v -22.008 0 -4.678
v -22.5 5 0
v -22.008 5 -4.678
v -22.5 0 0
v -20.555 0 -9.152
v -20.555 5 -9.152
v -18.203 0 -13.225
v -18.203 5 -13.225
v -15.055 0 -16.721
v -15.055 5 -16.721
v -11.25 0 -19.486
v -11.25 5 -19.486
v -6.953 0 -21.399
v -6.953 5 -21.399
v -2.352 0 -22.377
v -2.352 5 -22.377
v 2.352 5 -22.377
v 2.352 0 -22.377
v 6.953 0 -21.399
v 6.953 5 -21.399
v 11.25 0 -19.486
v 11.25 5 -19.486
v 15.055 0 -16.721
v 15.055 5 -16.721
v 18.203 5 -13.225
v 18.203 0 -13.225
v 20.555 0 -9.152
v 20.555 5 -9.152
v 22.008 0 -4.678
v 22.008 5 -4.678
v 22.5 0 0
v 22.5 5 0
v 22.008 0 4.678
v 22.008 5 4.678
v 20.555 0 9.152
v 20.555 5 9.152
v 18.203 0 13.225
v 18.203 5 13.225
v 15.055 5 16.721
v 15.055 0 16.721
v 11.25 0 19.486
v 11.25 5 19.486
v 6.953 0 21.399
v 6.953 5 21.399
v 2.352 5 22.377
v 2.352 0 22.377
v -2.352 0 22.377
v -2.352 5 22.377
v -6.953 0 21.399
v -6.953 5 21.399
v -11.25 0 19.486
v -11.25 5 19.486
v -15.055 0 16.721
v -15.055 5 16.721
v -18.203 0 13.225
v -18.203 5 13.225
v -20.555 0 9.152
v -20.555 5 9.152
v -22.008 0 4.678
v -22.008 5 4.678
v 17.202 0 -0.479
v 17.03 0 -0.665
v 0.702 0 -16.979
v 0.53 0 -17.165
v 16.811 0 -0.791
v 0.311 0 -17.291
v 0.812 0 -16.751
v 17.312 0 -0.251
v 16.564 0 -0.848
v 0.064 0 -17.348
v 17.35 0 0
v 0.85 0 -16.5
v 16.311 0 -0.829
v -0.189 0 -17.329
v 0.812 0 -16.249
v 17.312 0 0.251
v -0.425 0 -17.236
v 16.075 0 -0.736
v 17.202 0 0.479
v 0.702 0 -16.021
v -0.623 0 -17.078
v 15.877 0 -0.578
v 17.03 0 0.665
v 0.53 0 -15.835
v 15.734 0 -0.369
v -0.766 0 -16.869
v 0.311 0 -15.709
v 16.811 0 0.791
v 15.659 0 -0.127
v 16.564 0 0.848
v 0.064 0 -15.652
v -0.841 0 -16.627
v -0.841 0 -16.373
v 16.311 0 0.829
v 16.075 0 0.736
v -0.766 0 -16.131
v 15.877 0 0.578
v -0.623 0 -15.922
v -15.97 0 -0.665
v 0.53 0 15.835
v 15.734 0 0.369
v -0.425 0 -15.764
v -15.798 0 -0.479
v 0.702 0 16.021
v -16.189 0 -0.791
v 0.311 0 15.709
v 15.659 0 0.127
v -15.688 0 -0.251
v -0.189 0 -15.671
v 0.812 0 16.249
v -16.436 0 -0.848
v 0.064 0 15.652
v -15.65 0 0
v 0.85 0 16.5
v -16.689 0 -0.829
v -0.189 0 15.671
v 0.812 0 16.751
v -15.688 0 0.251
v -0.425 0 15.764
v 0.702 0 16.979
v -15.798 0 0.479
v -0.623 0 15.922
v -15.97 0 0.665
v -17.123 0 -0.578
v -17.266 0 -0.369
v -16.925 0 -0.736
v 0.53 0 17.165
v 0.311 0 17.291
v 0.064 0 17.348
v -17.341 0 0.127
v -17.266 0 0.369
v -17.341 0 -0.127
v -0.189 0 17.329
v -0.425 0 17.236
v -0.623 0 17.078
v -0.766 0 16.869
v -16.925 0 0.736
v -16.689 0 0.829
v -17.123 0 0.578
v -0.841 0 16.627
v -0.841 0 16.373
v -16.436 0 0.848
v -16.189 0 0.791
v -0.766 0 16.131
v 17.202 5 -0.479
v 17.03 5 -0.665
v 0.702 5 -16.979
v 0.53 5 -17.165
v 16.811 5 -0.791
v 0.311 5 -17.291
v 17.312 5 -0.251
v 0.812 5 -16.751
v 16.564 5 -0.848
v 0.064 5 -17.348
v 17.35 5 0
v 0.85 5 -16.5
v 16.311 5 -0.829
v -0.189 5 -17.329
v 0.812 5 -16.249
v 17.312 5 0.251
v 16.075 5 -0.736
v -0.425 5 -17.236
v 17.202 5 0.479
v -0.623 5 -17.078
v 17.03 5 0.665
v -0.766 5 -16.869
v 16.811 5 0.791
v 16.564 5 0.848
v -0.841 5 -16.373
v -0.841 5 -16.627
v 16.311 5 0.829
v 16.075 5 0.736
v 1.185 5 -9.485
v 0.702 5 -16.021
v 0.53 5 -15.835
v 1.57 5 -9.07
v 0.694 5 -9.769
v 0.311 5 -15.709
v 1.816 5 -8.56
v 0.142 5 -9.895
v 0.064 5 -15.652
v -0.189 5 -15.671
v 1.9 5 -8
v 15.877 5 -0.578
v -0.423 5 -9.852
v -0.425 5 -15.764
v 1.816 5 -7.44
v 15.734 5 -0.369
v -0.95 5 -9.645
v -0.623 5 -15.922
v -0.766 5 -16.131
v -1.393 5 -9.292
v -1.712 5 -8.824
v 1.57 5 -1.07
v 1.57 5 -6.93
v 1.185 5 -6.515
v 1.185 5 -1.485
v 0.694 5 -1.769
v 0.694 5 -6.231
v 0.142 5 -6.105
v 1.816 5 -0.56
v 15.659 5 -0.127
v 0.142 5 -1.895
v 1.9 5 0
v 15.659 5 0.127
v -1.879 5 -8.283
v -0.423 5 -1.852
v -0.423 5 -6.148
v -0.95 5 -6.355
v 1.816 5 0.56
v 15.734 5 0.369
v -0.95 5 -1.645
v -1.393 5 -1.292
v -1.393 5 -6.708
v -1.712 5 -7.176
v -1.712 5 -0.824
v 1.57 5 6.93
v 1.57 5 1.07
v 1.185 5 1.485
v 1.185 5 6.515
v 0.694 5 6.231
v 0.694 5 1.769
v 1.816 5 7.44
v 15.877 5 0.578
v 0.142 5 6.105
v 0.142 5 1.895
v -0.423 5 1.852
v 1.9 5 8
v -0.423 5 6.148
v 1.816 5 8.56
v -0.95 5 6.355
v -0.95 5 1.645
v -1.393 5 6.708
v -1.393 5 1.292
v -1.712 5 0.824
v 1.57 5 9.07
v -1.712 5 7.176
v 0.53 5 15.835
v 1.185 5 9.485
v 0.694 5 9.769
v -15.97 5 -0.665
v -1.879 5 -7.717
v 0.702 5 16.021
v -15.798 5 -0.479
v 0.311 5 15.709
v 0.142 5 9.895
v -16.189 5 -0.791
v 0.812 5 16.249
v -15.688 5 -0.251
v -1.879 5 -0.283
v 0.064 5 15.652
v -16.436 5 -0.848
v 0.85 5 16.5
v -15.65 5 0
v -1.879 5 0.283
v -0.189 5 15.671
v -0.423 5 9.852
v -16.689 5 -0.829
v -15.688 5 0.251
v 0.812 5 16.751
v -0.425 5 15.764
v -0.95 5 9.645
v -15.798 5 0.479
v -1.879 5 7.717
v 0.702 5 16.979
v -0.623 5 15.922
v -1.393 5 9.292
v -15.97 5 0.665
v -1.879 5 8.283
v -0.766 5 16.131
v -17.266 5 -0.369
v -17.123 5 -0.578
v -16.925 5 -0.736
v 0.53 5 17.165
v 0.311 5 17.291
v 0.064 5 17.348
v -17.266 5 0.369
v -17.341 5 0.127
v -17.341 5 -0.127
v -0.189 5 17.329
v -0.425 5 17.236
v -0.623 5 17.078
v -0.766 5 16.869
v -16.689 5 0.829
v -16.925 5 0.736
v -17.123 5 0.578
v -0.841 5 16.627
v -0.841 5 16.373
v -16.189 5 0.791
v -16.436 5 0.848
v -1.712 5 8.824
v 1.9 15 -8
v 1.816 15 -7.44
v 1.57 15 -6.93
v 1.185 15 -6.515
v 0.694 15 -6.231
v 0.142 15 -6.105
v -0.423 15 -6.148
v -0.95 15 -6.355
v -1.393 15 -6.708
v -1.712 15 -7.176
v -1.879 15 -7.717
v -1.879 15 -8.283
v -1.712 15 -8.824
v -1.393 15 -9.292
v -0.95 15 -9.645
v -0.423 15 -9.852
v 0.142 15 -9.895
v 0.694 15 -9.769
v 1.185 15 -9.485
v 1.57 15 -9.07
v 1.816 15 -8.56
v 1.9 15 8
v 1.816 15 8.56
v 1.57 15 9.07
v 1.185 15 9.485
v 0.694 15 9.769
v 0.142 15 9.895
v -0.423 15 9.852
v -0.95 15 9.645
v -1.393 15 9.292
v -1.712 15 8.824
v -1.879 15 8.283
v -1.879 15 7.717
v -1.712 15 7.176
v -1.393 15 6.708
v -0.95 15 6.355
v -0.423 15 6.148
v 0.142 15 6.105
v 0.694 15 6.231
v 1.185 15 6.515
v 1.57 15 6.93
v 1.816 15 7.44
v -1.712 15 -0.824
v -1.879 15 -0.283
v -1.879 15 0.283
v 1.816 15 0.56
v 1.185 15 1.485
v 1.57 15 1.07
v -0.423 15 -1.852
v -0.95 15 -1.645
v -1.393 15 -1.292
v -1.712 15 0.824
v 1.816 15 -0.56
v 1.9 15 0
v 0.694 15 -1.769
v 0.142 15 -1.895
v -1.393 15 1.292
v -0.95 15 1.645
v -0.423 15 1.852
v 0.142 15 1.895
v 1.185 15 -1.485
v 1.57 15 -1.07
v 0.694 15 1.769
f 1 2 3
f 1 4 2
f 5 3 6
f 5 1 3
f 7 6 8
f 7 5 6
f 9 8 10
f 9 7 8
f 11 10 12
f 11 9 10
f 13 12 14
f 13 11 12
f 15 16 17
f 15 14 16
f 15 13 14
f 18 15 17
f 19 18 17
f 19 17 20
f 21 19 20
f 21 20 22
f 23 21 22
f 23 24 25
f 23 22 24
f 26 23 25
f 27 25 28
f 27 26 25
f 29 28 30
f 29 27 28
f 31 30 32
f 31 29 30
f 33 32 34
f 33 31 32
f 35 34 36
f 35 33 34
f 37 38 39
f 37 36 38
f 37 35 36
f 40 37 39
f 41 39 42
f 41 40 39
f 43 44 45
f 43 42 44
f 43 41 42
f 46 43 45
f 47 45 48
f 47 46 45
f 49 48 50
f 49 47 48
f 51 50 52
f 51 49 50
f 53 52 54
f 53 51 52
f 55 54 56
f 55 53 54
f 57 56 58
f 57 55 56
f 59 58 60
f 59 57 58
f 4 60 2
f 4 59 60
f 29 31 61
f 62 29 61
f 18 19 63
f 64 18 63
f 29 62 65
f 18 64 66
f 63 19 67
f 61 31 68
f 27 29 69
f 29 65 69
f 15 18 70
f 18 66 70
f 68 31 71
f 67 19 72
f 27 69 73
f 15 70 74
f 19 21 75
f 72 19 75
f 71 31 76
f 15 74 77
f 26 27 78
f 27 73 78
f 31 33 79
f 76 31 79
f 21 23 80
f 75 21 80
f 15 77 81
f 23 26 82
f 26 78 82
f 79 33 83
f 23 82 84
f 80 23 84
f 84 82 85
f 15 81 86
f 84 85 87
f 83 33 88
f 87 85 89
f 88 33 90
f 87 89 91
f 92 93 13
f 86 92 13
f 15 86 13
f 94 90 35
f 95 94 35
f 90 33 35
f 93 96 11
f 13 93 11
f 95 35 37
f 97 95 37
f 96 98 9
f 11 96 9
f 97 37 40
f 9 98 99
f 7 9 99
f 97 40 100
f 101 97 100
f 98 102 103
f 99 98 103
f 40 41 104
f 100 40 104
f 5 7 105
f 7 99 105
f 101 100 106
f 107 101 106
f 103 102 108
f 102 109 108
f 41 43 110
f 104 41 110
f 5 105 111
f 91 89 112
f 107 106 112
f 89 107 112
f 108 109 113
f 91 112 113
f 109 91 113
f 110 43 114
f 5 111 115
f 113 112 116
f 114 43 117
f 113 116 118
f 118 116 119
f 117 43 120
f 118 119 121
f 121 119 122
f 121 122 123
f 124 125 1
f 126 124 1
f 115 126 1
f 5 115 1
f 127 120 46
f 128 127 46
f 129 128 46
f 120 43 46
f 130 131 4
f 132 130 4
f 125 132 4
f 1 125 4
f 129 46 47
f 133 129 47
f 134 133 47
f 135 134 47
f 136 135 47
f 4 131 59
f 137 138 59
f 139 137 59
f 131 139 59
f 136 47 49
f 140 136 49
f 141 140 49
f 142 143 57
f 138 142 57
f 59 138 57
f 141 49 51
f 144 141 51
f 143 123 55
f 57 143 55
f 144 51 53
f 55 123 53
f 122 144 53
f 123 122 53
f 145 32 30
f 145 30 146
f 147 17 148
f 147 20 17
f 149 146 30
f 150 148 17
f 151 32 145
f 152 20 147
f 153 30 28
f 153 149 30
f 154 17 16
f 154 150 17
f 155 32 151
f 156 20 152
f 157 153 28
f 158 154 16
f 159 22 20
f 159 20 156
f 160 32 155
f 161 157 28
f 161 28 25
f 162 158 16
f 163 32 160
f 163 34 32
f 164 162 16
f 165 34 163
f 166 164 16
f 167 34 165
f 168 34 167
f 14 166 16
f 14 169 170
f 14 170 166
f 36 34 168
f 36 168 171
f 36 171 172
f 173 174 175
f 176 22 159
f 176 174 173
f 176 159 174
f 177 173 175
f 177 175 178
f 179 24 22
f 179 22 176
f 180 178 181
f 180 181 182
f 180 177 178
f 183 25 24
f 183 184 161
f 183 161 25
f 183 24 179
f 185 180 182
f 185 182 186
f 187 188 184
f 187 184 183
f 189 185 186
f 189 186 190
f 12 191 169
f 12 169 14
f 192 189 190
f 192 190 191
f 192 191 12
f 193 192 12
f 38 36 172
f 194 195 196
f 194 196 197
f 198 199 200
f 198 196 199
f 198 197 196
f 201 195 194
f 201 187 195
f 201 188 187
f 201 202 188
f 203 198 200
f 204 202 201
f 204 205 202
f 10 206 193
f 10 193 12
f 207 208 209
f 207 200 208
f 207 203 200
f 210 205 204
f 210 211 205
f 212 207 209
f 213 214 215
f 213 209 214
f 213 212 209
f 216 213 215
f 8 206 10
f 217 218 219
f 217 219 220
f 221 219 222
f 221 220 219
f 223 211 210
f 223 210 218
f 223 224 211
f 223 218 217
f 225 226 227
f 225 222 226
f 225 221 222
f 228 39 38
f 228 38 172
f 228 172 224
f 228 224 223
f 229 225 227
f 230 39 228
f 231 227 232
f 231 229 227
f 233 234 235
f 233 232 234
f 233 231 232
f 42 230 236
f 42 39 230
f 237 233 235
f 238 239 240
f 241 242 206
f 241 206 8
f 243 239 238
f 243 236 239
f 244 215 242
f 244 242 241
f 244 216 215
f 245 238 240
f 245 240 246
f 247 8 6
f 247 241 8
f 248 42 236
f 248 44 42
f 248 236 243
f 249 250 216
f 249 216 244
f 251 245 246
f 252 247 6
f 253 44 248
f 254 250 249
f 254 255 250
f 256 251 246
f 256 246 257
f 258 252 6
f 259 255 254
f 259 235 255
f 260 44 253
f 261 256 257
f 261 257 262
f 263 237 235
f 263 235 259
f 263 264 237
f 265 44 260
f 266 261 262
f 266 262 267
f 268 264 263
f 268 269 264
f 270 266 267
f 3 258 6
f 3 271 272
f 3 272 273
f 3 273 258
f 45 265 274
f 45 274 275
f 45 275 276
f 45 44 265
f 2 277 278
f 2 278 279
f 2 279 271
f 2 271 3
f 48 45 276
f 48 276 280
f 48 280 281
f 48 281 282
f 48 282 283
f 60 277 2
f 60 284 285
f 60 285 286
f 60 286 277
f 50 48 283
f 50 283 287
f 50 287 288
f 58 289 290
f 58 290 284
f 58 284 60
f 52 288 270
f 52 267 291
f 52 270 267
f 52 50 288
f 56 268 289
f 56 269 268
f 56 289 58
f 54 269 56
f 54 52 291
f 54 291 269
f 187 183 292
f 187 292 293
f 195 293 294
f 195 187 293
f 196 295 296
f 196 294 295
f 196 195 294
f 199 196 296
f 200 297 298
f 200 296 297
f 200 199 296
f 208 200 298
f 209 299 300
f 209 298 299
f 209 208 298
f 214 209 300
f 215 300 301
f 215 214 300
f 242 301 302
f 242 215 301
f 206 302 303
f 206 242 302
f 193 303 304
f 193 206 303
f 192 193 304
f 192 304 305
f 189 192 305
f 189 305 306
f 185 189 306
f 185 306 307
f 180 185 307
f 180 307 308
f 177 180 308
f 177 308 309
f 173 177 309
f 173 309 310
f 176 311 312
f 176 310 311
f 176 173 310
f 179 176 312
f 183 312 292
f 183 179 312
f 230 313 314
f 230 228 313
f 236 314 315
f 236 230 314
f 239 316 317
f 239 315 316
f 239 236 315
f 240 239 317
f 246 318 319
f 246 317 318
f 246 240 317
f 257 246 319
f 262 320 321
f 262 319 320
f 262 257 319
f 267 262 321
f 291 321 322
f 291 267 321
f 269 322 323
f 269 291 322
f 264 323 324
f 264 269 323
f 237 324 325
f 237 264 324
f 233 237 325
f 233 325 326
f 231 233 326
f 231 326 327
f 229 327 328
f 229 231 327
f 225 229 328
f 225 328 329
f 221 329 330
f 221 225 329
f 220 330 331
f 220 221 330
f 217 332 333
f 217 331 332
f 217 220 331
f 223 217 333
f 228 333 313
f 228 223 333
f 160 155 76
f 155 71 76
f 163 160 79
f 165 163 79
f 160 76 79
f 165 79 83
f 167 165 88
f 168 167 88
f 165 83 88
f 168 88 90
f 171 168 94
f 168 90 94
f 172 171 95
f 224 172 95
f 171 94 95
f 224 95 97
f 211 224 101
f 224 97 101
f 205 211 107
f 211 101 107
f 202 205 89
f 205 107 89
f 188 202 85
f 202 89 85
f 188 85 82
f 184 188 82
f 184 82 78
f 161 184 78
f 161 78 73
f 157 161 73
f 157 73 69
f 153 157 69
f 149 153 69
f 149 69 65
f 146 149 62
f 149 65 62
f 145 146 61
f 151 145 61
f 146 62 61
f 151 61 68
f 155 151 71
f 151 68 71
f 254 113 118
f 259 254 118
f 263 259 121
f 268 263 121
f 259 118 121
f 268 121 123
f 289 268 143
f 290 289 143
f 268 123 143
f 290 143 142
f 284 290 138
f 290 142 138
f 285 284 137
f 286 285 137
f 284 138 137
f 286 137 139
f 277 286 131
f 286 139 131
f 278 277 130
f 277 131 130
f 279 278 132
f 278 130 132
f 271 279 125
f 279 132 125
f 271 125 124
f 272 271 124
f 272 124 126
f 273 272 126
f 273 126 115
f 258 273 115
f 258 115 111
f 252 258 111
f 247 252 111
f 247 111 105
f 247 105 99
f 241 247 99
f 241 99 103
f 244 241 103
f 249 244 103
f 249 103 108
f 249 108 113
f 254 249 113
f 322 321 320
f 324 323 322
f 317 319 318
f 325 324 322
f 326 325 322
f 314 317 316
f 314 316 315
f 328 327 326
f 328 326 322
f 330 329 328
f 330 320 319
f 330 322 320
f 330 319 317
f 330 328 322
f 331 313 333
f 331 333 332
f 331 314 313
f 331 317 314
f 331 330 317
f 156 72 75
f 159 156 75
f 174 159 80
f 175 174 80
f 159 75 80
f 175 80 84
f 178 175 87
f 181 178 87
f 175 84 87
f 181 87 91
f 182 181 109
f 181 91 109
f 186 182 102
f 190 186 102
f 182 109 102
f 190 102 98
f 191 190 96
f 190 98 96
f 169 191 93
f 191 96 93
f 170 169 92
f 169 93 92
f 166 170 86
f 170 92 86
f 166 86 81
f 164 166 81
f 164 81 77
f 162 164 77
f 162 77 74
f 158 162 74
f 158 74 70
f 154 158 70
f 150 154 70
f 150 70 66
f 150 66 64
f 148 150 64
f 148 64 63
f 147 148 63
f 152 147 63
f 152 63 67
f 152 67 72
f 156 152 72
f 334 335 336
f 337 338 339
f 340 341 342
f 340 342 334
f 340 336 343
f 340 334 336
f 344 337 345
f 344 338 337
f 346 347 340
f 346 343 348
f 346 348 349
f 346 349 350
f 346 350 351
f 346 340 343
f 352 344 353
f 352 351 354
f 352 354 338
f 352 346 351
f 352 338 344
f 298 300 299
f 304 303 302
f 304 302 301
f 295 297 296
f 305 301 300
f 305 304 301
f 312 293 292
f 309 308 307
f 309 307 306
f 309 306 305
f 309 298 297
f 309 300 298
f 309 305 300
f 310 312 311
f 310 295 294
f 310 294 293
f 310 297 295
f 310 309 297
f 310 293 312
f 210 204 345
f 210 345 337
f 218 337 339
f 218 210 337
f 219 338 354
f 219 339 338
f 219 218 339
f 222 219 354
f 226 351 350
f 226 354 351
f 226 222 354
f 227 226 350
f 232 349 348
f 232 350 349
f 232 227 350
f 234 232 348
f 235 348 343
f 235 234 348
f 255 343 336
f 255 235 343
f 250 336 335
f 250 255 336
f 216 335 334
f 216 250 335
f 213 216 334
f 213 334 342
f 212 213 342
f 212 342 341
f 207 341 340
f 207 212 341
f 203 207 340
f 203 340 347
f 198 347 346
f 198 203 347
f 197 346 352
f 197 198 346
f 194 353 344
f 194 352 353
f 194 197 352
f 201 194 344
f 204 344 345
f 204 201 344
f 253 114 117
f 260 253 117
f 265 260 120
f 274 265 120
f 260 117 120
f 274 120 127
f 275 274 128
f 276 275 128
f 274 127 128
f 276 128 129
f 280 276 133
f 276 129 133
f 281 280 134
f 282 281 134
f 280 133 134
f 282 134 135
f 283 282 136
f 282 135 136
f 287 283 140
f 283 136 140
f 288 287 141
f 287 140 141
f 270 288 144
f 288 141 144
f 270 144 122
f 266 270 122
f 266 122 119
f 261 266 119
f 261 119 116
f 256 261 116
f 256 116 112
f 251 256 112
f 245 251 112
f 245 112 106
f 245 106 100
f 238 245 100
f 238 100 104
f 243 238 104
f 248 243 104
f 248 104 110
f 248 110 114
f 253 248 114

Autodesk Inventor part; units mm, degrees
ref_plane "YZ Plane" through (0, 0, 0) normal (1, 0, 0) x (0, 1, 0)
ref_plane "XZ Plane" through (0, 0, 0) normal (0, 1, 0) x (-1, 0, 0)
ref_plane "XY Plane" through (0, 0, 0) normal (0, 0, 1) x (1, 0, 0)
sketch "Sketch1" plane through (0, 0, 0) normal (0, 1, 0) x (-1, 0, 0)
  circle A0 centre (0, 0) radius 22.5
  dimension "d0" = 45
extrude "Extrusion1" add sketch "Sketch1" along normal blind 5
sketch "Sketch2" plane through (0, 5, 0) normal (0, 1, 0) x (1, 0, 0)
  line L0 (0, 0) -> (0, 8) construction
  line L1 (0, 0) -> (0, -8) construction
  circle A0 centre (0, 8) radius 1.9
  circle A1 centre (0, 0) radius 1.9
  circle A2 centre (0, -8) radius 1.9
  dimension "d3" = 8
  dimension "d4" = 8
  dimension "d5" = 3.8
  dimension "d6" = 3.8
  dimension "d7" = 3.8
extrude "Extrusion2" add sketch "Sketch2" along normal blind 10
sketch "Sketch7" plane through (0, 0, 0) normal (0, -1, 0) x (1, 0, 0)
  circle A0 centre (0, 0) radius 16.5 construction
  circle A1 centre (0, 16.5) radius 0.85
  circle A2 centre (16.5, 0) radius 0.85
  circle A3 centre (-16.5, 0) radius 0.85
  circle A4 centre (0, -16.5) radius 0.85
  dimension "d42" = 33
  dimension "d43" = 1.7
  dimension "d44" = 1.7
  dimension "d45" = 1.7
  dimension "d46" = 1.7
extrude "Extrusion6" cut sketch "Sketch7" against normal blind 5
properties part number "Motor Mount Barebones"
